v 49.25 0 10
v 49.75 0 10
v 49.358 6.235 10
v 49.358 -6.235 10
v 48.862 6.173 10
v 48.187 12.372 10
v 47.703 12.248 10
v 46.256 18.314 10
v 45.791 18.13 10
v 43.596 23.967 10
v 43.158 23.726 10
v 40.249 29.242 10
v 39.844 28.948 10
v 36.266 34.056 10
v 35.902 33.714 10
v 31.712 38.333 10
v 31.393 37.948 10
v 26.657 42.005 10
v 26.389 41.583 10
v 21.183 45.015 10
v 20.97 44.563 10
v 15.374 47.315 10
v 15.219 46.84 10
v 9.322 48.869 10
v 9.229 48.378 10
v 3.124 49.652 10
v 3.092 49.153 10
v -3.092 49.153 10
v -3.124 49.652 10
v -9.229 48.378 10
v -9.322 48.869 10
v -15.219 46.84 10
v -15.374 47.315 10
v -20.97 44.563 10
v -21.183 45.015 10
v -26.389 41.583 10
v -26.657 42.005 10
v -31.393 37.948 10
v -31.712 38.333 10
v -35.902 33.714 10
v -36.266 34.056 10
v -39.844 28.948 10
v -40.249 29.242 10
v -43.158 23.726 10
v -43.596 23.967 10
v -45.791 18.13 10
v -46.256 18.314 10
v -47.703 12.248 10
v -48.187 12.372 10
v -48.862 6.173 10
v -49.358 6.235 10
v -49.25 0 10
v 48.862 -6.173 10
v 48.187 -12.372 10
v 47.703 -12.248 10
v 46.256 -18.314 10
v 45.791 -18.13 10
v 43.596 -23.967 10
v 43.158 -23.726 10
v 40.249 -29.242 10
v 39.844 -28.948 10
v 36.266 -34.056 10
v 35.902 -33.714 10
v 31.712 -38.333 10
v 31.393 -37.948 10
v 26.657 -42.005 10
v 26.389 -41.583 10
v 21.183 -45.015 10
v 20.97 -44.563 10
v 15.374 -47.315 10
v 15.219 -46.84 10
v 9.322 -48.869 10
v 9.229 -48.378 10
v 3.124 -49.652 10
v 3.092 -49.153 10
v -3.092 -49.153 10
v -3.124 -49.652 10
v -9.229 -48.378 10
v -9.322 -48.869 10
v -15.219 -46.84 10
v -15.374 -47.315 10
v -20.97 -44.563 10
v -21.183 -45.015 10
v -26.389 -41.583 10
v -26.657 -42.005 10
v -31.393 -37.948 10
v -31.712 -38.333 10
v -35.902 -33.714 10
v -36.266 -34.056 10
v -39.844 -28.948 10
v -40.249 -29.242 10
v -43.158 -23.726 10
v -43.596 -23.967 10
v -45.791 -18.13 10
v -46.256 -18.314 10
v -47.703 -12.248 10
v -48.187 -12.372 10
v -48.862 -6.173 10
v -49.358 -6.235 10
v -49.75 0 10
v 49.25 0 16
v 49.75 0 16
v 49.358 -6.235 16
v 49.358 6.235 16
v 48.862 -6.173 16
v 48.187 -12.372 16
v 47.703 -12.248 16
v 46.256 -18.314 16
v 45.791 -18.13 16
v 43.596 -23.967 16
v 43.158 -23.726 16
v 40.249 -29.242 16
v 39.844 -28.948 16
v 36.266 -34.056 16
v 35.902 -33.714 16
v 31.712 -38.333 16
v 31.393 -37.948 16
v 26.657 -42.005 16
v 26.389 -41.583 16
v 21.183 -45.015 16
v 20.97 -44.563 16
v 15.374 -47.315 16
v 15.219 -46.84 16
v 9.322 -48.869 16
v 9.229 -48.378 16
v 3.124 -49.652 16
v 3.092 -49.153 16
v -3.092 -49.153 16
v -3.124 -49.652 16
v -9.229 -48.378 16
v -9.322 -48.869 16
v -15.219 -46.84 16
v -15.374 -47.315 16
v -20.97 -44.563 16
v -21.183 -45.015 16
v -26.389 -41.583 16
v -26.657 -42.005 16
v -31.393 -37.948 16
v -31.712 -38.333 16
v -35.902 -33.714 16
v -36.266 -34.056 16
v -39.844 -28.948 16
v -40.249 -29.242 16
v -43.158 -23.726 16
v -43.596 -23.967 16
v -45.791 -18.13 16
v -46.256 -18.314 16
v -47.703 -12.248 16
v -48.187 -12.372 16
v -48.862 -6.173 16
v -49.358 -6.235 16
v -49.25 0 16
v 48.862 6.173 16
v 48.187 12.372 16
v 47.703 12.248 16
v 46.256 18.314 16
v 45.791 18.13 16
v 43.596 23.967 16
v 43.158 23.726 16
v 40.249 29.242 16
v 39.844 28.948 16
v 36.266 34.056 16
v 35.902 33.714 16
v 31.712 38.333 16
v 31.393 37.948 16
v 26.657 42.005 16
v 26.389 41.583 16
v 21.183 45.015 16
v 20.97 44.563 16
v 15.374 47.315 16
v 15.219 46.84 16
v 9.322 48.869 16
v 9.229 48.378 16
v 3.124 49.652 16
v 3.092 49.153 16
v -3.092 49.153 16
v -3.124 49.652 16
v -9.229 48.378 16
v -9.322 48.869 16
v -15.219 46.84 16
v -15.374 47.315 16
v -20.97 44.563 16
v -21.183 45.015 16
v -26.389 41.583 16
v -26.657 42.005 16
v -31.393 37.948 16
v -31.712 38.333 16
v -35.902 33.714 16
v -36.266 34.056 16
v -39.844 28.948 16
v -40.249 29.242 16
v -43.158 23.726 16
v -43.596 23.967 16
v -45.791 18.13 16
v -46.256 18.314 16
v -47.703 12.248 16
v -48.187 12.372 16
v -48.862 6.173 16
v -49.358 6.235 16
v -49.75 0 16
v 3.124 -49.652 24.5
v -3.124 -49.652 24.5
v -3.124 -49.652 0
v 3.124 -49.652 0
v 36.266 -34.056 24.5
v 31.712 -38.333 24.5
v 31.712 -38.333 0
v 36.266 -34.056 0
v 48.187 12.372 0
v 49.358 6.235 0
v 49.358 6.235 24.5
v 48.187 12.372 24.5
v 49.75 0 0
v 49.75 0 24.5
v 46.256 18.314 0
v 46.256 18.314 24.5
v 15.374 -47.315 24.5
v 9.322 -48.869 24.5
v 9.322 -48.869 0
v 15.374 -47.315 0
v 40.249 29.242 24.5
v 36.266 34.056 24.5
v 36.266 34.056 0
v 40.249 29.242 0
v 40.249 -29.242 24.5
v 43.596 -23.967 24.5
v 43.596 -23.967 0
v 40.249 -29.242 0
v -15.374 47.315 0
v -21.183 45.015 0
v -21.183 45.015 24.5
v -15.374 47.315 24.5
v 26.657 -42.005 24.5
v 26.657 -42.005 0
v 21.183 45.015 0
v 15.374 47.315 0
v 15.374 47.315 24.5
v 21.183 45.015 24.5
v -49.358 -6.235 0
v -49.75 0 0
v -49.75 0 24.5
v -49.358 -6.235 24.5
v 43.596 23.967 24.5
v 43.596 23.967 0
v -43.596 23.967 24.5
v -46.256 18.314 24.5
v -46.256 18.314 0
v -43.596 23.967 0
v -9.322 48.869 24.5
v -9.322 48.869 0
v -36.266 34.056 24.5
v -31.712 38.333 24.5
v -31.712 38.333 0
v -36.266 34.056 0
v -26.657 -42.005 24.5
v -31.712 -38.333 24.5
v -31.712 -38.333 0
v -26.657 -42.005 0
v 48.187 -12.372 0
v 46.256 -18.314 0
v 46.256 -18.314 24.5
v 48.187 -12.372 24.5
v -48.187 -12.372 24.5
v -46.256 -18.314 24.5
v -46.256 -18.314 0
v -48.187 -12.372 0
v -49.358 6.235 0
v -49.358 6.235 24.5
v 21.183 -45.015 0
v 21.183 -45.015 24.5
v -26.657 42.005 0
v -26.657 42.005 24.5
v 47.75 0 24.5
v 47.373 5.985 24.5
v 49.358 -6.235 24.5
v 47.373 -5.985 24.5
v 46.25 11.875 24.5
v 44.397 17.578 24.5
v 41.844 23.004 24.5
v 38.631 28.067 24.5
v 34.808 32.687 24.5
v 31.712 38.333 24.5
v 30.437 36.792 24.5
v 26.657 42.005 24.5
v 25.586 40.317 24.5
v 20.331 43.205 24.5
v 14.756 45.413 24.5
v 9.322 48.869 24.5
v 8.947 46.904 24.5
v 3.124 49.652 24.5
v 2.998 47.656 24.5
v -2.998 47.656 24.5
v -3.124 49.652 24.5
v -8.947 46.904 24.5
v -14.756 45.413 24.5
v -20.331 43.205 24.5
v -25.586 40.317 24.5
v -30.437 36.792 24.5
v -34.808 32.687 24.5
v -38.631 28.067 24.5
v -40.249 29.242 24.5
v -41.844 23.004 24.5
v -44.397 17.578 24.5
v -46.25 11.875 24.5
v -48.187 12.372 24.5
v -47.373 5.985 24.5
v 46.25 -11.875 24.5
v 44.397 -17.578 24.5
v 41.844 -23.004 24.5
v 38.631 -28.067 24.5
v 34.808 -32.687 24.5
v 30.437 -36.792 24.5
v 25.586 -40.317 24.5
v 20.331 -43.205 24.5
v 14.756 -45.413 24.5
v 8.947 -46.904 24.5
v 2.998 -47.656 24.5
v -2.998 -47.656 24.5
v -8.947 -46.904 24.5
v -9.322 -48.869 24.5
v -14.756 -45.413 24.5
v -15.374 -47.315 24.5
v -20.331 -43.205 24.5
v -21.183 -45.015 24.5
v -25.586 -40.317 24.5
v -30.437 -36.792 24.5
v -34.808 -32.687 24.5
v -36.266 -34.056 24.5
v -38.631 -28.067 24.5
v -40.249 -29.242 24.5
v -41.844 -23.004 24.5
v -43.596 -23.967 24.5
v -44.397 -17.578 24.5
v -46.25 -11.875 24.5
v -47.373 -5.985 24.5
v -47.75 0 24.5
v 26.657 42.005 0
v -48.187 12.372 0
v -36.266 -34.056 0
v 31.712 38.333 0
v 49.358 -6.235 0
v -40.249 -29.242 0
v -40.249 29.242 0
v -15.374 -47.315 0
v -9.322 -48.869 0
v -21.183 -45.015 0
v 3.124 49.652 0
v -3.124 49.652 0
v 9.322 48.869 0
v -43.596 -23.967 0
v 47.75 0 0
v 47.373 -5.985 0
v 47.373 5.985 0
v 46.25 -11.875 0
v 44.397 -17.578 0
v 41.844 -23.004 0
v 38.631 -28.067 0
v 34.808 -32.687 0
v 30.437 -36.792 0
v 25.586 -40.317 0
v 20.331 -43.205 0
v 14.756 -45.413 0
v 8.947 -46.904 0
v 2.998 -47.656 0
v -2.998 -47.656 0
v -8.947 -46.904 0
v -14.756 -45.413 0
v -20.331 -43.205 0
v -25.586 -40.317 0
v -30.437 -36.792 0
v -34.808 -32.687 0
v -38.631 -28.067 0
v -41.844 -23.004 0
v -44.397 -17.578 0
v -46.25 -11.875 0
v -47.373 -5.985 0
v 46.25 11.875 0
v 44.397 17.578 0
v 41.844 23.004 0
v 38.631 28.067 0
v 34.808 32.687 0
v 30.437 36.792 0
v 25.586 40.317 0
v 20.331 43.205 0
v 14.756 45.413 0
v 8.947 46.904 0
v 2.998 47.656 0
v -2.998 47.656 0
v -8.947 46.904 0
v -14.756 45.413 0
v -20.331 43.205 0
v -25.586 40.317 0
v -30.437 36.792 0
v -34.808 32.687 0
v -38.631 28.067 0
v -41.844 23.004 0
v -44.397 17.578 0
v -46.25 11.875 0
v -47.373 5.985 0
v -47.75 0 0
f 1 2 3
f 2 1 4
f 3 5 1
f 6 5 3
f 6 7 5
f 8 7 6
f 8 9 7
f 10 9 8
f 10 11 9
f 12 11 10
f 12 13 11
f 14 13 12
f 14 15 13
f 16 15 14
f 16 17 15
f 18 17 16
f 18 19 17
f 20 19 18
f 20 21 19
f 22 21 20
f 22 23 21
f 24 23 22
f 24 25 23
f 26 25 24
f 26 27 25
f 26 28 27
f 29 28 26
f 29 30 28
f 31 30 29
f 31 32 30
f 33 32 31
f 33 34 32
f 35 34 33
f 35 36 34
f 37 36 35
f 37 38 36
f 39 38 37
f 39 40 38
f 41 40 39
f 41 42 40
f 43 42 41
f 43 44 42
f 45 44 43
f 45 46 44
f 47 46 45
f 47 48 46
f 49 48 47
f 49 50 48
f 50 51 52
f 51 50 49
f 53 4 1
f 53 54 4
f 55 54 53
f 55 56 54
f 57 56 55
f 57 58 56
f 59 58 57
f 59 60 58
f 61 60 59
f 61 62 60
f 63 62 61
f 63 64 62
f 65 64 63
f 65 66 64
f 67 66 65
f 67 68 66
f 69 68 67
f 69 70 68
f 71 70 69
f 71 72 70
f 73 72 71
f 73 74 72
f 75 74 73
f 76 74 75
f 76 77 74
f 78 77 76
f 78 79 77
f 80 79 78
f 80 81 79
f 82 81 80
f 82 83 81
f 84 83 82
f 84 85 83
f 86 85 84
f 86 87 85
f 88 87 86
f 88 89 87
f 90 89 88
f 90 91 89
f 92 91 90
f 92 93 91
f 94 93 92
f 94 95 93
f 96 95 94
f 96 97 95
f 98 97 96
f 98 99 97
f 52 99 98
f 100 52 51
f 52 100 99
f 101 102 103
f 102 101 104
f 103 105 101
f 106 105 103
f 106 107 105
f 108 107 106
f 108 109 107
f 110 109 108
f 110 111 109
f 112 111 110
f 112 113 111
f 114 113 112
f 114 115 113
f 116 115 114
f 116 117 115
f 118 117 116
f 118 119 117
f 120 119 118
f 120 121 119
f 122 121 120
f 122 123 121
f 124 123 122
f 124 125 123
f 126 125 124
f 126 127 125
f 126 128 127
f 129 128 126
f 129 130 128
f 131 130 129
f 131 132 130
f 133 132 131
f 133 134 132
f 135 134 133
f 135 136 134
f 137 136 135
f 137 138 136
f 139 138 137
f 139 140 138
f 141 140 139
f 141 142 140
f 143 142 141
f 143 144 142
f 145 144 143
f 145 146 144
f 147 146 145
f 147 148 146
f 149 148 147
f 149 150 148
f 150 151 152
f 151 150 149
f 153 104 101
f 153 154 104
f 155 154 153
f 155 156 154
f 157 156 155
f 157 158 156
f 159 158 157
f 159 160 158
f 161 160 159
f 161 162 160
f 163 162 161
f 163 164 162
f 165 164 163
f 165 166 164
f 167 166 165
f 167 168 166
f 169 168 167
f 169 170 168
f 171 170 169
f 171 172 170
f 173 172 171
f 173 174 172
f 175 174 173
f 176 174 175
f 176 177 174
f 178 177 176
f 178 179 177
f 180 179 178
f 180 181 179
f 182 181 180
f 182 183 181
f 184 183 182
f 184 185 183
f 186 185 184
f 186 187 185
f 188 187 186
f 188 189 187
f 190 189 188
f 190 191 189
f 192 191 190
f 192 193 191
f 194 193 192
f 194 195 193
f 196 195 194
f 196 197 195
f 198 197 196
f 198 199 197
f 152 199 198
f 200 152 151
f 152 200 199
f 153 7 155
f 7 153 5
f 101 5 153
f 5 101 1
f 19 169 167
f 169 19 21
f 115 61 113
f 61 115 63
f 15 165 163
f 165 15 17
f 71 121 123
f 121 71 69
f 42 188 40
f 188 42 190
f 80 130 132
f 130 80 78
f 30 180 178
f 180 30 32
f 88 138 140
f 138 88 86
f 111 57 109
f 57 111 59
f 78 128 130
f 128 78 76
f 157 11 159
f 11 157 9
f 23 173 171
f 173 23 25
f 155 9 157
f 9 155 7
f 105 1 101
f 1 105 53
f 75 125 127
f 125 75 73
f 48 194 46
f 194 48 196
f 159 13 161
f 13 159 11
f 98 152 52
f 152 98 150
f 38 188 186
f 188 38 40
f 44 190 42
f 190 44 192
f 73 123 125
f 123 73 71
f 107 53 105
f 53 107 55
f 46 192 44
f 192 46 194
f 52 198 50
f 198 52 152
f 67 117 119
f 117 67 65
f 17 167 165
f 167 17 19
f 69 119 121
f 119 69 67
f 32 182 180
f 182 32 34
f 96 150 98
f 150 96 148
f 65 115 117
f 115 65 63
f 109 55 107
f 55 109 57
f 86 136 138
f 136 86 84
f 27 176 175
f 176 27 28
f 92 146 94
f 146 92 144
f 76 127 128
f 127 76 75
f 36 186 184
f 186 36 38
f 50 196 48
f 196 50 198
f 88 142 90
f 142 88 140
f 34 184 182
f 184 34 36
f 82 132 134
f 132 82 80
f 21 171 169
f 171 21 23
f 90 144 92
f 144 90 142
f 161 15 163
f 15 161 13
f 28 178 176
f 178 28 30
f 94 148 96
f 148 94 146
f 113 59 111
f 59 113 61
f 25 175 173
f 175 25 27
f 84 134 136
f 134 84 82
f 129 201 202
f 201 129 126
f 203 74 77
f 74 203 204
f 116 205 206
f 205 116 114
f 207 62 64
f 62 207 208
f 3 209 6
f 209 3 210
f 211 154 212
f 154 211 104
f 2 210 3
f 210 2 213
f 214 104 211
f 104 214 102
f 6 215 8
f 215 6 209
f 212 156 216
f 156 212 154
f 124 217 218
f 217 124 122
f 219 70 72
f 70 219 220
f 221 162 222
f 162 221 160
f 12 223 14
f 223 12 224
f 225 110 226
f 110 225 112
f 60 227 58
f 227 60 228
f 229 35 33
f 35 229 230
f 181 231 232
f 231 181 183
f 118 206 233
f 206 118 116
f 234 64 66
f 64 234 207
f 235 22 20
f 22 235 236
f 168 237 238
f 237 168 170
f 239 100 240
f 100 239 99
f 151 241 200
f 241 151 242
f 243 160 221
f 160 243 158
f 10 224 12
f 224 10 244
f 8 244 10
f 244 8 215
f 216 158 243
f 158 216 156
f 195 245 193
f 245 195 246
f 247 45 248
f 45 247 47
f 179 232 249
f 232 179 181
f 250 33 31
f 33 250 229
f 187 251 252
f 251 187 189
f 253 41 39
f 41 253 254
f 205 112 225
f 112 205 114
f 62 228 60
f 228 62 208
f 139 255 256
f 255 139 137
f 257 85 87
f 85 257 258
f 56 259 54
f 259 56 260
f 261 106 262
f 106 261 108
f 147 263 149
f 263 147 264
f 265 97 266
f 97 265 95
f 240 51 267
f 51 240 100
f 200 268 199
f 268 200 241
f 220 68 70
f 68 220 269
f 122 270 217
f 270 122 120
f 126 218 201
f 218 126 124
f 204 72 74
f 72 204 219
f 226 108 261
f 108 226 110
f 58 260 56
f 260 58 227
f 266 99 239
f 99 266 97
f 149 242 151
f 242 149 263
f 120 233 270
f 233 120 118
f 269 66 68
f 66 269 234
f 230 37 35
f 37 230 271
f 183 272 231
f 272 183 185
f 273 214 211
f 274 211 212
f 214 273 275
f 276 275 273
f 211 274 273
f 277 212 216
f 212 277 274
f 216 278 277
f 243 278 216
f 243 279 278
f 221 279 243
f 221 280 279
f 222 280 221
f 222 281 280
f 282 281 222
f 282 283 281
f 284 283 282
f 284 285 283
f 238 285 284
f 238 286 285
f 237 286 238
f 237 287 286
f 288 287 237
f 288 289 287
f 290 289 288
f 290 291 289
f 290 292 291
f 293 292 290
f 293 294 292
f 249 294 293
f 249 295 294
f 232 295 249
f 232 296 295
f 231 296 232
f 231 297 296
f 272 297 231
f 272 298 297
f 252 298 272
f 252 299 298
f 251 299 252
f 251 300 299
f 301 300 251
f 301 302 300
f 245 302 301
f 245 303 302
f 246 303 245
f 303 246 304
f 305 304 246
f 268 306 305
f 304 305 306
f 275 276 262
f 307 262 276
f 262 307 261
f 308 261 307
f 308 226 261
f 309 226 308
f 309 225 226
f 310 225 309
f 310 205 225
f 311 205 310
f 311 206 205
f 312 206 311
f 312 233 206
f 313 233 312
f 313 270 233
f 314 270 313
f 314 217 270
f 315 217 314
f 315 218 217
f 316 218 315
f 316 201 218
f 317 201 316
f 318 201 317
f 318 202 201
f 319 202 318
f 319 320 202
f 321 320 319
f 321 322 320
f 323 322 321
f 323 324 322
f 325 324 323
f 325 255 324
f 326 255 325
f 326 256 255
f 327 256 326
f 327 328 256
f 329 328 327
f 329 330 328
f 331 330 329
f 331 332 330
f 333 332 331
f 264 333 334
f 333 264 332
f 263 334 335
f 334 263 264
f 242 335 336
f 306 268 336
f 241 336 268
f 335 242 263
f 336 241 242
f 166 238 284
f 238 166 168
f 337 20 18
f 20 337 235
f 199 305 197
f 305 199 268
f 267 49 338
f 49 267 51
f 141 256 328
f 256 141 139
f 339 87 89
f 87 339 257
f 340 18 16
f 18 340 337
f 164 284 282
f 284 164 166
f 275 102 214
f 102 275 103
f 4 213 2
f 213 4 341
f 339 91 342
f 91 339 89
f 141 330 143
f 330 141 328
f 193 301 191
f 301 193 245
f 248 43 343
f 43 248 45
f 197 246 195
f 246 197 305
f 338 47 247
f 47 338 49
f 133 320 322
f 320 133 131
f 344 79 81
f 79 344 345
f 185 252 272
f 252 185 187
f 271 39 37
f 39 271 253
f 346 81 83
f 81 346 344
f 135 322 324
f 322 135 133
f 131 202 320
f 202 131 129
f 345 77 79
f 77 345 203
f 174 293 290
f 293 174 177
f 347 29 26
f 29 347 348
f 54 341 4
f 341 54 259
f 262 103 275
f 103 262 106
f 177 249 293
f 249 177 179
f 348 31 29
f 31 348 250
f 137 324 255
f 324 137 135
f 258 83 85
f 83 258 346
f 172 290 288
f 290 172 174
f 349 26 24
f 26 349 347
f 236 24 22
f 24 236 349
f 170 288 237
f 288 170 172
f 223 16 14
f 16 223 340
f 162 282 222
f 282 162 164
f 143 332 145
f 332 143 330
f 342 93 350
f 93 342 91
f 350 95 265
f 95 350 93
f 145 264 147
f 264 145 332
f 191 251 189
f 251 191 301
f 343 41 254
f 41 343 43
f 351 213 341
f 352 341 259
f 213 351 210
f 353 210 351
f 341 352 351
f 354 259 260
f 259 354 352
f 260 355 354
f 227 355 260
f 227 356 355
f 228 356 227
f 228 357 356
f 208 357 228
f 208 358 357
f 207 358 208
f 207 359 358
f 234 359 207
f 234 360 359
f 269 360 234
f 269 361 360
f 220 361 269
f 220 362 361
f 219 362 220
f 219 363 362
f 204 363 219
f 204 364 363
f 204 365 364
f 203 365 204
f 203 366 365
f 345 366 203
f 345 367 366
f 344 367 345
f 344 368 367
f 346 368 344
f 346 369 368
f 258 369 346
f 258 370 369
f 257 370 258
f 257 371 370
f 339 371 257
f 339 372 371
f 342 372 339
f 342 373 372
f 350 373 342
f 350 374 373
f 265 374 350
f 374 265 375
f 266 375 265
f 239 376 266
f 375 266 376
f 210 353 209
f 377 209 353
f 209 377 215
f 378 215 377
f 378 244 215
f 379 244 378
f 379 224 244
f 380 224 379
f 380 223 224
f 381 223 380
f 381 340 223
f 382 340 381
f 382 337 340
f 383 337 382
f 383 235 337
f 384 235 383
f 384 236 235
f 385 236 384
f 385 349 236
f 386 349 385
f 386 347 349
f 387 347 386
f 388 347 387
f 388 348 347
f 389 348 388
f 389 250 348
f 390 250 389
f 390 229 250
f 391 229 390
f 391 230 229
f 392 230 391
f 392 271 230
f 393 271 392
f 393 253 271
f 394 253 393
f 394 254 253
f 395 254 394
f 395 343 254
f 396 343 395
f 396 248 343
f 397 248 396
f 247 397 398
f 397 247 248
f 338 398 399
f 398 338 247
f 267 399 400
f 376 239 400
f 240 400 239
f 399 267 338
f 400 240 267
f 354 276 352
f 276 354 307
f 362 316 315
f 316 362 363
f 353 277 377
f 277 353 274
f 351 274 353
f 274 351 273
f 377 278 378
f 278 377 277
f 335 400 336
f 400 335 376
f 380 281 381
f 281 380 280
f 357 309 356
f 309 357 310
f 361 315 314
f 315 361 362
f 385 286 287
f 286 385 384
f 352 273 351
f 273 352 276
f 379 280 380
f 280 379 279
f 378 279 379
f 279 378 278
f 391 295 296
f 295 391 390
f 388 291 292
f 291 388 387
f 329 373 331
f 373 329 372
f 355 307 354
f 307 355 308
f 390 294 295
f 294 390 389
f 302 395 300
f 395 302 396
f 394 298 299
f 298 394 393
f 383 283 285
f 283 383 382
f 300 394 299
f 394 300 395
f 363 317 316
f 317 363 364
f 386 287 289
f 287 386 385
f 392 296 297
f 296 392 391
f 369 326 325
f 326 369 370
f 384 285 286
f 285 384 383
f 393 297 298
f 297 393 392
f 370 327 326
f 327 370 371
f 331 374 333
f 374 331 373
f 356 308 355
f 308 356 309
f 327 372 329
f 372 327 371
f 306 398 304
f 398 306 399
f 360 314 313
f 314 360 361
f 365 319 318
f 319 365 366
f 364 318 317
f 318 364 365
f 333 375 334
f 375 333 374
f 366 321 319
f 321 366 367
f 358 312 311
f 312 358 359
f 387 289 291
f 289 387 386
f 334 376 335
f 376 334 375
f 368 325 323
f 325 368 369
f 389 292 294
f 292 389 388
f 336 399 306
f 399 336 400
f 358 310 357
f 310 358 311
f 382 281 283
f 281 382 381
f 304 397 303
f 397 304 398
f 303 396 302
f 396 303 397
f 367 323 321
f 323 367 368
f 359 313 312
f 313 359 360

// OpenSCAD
/* Glowforge port extender v1
 * Designed by Techyg
 *
 * Purpose: Extend the back 4" port on the glowforge and allow for 
 * an easier time making the connection.  
 * If using the default settings below, you will have an additional 12mm extension
 * There is also a recess (lip) that your connector is meant to sit on to help secure it
 *
 * Print with a semi flex filament, such as Sainsmart TPU. 
 * It is designed to be stretched over the exhaust port and should be very snug. 
 * 
 */ 

//Settings for thickness and diameter below.
//All measurements are milimeters
//Only change if you know what you're doing

$fn=50;
port_od = 95.5; //glowforge outer diameter of exhaust port measured around 97 mm. Minus 1.5mm for tight tolerance
port_depth = 12.5; //length of the port on the GF 
extender_depth = port_depth + 12;
extender_thickness = 4; //thickness of the extender 
extender_od = port_od + extender_thickness;
extender_connect_lip_depth = 10; //where we want the connection to start (measured from bottom)
extender_connect_lip_length = 6; //length of the lip
extender_connect_recess = extender_od-1; //recess of lip


difference()
{
    cylinder(r=extender_od/2, h=extender_depth); //build outer diameter of extender
    cylinder(r=port_od/2, h=extender_depth+1); //subtract inner diameter of extender
    translate([0,0,extender_connect_lip_depth])
    difference() //subtract the "lip"
    {
        cylinder(r=105/2, h=extender_connect_lip_length); //outside lip 
        cylinder(r=extender_connect_recess/2, h=extender_connect_lip_length); //inside lip 
    }
}
